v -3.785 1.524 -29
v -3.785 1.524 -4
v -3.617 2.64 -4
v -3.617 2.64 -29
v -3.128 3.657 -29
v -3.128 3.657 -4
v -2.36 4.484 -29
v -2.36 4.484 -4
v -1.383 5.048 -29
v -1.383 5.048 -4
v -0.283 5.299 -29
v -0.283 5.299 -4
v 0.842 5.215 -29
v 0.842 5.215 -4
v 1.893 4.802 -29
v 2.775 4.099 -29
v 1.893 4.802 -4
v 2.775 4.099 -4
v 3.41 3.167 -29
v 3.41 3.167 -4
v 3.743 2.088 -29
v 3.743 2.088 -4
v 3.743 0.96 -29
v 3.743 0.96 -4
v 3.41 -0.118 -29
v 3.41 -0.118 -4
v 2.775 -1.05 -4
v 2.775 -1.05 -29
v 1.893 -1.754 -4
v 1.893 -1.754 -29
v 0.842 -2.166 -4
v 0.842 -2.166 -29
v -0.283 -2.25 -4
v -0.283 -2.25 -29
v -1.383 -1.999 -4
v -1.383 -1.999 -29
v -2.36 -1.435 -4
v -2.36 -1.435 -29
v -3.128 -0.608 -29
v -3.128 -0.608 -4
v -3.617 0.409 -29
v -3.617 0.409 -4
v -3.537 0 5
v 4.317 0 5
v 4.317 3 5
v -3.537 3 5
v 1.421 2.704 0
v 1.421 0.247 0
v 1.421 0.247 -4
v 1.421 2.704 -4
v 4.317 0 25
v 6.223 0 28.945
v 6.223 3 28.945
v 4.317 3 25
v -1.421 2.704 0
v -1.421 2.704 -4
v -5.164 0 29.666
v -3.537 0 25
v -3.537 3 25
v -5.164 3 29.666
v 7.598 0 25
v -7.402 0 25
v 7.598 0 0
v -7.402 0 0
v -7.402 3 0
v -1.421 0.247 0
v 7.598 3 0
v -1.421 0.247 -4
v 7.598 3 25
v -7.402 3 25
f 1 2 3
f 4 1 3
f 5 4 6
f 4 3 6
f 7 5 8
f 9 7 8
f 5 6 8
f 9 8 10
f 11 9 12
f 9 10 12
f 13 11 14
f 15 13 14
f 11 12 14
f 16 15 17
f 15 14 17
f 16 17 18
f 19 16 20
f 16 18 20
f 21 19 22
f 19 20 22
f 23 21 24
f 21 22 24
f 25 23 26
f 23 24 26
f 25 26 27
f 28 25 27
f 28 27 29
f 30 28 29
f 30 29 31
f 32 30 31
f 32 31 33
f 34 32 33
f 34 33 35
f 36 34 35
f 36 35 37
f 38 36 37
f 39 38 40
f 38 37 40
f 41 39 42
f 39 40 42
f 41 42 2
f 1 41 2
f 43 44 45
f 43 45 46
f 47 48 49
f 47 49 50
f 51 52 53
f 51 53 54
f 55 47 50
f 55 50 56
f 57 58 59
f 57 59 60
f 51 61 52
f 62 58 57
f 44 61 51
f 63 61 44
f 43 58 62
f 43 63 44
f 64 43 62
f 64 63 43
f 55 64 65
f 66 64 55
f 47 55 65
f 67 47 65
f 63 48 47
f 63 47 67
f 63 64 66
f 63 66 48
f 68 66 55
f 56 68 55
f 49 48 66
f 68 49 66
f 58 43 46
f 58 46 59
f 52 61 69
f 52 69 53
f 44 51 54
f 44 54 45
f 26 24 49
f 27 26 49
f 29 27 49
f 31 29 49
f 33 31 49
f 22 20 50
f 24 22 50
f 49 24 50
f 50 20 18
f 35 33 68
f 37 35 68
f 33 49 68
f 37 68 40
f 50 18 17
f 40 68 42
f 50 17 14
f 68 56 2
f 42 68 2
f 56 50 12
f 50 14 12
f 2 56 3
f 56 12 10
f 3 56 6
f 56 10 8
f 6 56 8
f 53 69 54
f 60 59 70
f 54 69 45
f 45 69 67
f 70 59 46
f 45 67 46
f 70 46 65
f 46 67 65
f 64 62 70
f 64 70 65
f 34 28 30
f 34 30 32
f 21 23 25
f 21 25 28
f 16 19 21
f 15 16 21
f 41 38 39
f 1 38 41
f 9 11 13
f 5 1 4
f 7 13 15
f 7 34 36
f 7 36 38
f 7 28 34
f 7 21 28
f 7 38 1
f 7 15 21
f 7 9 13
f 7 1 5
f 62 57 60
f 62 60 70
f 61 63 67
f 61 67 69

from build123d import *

# Parameters (mm, degrees)
BOSS_EXTRUDE1_DEPTH = 3
SKETCH2_W           = 2.84238377
SKETCH2_H           = 2.456975153
BOSS_EXTRUDE2_DEPTH = 4
SKETCH3_R           = 3.785280903
BOSS_EXTRUDE3_DEPTH = 25


with BuildPart() as part:
    # Sketch1 → Boss-Extrude1 (new body)
    with BuildSketch(Plane(origin=(0, 0, 0), x_dir=(1, 0, 0), z_dir=(0, 1, 0))):
        Polygon((-7.401746725, 0), (7.598253275, 0), (7.598253275, -25), (6.222707424, -28.945414847), (4.317186999, -25), (4.317186999, -5), (-3.537117904, -5), (-3.537117904, -25), (-5.163870247, -29.665938865), (-7.401746725, -25), align=None)
    extrude(amount=BOSS_EXTRUDE1_DEPTH)

    # Sketch2 → Boss-Extrude2 (add)
    with BuildSketch(Plane(origin=(0, 0, 0), x_dir=(-1, 0, 0), z_dir=(0, 0, -1))):
        with Locations((0, 1.475753534)):
            Rectangle(SKETCH2_W, SKETCH2_H)
    extrude(amount=BOSS_EXTRUDE2_DEPTH)

    # Sketch3 → Boss-Extrude3 (add)
    with BuildSketch(Plane(origin=(0, 0, -4), x_dir=(-1, 0, 0), z_dir=(0, 0, -1))):
        with Locations((0, 1.524246465)):
            Circle(SKETCH3_R)
    extrude(amount=BOSS_EXTRUDE3_DEPTH)


solid = part.part
